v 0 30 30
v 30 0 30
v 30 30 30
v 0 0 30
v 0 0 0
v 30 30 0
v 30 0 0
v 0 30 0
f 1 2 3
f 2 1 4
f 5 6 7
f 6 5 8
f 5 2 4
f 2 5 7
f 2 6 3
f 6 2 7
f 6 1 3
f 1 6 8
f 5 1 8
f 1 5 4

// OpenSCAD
// [Dimensions]
width = 30; // [0:100]

// [Options]
// Corner style is not necessary here but kept for the parameter block.
corner_style = "round";

// Define height as a parameter, defaulting to 30mm if not specified.
h = 30;

/* Derived Values */
// Since only a single dimension is defined, no need to derive anything else.

cube([width, width, h]);
